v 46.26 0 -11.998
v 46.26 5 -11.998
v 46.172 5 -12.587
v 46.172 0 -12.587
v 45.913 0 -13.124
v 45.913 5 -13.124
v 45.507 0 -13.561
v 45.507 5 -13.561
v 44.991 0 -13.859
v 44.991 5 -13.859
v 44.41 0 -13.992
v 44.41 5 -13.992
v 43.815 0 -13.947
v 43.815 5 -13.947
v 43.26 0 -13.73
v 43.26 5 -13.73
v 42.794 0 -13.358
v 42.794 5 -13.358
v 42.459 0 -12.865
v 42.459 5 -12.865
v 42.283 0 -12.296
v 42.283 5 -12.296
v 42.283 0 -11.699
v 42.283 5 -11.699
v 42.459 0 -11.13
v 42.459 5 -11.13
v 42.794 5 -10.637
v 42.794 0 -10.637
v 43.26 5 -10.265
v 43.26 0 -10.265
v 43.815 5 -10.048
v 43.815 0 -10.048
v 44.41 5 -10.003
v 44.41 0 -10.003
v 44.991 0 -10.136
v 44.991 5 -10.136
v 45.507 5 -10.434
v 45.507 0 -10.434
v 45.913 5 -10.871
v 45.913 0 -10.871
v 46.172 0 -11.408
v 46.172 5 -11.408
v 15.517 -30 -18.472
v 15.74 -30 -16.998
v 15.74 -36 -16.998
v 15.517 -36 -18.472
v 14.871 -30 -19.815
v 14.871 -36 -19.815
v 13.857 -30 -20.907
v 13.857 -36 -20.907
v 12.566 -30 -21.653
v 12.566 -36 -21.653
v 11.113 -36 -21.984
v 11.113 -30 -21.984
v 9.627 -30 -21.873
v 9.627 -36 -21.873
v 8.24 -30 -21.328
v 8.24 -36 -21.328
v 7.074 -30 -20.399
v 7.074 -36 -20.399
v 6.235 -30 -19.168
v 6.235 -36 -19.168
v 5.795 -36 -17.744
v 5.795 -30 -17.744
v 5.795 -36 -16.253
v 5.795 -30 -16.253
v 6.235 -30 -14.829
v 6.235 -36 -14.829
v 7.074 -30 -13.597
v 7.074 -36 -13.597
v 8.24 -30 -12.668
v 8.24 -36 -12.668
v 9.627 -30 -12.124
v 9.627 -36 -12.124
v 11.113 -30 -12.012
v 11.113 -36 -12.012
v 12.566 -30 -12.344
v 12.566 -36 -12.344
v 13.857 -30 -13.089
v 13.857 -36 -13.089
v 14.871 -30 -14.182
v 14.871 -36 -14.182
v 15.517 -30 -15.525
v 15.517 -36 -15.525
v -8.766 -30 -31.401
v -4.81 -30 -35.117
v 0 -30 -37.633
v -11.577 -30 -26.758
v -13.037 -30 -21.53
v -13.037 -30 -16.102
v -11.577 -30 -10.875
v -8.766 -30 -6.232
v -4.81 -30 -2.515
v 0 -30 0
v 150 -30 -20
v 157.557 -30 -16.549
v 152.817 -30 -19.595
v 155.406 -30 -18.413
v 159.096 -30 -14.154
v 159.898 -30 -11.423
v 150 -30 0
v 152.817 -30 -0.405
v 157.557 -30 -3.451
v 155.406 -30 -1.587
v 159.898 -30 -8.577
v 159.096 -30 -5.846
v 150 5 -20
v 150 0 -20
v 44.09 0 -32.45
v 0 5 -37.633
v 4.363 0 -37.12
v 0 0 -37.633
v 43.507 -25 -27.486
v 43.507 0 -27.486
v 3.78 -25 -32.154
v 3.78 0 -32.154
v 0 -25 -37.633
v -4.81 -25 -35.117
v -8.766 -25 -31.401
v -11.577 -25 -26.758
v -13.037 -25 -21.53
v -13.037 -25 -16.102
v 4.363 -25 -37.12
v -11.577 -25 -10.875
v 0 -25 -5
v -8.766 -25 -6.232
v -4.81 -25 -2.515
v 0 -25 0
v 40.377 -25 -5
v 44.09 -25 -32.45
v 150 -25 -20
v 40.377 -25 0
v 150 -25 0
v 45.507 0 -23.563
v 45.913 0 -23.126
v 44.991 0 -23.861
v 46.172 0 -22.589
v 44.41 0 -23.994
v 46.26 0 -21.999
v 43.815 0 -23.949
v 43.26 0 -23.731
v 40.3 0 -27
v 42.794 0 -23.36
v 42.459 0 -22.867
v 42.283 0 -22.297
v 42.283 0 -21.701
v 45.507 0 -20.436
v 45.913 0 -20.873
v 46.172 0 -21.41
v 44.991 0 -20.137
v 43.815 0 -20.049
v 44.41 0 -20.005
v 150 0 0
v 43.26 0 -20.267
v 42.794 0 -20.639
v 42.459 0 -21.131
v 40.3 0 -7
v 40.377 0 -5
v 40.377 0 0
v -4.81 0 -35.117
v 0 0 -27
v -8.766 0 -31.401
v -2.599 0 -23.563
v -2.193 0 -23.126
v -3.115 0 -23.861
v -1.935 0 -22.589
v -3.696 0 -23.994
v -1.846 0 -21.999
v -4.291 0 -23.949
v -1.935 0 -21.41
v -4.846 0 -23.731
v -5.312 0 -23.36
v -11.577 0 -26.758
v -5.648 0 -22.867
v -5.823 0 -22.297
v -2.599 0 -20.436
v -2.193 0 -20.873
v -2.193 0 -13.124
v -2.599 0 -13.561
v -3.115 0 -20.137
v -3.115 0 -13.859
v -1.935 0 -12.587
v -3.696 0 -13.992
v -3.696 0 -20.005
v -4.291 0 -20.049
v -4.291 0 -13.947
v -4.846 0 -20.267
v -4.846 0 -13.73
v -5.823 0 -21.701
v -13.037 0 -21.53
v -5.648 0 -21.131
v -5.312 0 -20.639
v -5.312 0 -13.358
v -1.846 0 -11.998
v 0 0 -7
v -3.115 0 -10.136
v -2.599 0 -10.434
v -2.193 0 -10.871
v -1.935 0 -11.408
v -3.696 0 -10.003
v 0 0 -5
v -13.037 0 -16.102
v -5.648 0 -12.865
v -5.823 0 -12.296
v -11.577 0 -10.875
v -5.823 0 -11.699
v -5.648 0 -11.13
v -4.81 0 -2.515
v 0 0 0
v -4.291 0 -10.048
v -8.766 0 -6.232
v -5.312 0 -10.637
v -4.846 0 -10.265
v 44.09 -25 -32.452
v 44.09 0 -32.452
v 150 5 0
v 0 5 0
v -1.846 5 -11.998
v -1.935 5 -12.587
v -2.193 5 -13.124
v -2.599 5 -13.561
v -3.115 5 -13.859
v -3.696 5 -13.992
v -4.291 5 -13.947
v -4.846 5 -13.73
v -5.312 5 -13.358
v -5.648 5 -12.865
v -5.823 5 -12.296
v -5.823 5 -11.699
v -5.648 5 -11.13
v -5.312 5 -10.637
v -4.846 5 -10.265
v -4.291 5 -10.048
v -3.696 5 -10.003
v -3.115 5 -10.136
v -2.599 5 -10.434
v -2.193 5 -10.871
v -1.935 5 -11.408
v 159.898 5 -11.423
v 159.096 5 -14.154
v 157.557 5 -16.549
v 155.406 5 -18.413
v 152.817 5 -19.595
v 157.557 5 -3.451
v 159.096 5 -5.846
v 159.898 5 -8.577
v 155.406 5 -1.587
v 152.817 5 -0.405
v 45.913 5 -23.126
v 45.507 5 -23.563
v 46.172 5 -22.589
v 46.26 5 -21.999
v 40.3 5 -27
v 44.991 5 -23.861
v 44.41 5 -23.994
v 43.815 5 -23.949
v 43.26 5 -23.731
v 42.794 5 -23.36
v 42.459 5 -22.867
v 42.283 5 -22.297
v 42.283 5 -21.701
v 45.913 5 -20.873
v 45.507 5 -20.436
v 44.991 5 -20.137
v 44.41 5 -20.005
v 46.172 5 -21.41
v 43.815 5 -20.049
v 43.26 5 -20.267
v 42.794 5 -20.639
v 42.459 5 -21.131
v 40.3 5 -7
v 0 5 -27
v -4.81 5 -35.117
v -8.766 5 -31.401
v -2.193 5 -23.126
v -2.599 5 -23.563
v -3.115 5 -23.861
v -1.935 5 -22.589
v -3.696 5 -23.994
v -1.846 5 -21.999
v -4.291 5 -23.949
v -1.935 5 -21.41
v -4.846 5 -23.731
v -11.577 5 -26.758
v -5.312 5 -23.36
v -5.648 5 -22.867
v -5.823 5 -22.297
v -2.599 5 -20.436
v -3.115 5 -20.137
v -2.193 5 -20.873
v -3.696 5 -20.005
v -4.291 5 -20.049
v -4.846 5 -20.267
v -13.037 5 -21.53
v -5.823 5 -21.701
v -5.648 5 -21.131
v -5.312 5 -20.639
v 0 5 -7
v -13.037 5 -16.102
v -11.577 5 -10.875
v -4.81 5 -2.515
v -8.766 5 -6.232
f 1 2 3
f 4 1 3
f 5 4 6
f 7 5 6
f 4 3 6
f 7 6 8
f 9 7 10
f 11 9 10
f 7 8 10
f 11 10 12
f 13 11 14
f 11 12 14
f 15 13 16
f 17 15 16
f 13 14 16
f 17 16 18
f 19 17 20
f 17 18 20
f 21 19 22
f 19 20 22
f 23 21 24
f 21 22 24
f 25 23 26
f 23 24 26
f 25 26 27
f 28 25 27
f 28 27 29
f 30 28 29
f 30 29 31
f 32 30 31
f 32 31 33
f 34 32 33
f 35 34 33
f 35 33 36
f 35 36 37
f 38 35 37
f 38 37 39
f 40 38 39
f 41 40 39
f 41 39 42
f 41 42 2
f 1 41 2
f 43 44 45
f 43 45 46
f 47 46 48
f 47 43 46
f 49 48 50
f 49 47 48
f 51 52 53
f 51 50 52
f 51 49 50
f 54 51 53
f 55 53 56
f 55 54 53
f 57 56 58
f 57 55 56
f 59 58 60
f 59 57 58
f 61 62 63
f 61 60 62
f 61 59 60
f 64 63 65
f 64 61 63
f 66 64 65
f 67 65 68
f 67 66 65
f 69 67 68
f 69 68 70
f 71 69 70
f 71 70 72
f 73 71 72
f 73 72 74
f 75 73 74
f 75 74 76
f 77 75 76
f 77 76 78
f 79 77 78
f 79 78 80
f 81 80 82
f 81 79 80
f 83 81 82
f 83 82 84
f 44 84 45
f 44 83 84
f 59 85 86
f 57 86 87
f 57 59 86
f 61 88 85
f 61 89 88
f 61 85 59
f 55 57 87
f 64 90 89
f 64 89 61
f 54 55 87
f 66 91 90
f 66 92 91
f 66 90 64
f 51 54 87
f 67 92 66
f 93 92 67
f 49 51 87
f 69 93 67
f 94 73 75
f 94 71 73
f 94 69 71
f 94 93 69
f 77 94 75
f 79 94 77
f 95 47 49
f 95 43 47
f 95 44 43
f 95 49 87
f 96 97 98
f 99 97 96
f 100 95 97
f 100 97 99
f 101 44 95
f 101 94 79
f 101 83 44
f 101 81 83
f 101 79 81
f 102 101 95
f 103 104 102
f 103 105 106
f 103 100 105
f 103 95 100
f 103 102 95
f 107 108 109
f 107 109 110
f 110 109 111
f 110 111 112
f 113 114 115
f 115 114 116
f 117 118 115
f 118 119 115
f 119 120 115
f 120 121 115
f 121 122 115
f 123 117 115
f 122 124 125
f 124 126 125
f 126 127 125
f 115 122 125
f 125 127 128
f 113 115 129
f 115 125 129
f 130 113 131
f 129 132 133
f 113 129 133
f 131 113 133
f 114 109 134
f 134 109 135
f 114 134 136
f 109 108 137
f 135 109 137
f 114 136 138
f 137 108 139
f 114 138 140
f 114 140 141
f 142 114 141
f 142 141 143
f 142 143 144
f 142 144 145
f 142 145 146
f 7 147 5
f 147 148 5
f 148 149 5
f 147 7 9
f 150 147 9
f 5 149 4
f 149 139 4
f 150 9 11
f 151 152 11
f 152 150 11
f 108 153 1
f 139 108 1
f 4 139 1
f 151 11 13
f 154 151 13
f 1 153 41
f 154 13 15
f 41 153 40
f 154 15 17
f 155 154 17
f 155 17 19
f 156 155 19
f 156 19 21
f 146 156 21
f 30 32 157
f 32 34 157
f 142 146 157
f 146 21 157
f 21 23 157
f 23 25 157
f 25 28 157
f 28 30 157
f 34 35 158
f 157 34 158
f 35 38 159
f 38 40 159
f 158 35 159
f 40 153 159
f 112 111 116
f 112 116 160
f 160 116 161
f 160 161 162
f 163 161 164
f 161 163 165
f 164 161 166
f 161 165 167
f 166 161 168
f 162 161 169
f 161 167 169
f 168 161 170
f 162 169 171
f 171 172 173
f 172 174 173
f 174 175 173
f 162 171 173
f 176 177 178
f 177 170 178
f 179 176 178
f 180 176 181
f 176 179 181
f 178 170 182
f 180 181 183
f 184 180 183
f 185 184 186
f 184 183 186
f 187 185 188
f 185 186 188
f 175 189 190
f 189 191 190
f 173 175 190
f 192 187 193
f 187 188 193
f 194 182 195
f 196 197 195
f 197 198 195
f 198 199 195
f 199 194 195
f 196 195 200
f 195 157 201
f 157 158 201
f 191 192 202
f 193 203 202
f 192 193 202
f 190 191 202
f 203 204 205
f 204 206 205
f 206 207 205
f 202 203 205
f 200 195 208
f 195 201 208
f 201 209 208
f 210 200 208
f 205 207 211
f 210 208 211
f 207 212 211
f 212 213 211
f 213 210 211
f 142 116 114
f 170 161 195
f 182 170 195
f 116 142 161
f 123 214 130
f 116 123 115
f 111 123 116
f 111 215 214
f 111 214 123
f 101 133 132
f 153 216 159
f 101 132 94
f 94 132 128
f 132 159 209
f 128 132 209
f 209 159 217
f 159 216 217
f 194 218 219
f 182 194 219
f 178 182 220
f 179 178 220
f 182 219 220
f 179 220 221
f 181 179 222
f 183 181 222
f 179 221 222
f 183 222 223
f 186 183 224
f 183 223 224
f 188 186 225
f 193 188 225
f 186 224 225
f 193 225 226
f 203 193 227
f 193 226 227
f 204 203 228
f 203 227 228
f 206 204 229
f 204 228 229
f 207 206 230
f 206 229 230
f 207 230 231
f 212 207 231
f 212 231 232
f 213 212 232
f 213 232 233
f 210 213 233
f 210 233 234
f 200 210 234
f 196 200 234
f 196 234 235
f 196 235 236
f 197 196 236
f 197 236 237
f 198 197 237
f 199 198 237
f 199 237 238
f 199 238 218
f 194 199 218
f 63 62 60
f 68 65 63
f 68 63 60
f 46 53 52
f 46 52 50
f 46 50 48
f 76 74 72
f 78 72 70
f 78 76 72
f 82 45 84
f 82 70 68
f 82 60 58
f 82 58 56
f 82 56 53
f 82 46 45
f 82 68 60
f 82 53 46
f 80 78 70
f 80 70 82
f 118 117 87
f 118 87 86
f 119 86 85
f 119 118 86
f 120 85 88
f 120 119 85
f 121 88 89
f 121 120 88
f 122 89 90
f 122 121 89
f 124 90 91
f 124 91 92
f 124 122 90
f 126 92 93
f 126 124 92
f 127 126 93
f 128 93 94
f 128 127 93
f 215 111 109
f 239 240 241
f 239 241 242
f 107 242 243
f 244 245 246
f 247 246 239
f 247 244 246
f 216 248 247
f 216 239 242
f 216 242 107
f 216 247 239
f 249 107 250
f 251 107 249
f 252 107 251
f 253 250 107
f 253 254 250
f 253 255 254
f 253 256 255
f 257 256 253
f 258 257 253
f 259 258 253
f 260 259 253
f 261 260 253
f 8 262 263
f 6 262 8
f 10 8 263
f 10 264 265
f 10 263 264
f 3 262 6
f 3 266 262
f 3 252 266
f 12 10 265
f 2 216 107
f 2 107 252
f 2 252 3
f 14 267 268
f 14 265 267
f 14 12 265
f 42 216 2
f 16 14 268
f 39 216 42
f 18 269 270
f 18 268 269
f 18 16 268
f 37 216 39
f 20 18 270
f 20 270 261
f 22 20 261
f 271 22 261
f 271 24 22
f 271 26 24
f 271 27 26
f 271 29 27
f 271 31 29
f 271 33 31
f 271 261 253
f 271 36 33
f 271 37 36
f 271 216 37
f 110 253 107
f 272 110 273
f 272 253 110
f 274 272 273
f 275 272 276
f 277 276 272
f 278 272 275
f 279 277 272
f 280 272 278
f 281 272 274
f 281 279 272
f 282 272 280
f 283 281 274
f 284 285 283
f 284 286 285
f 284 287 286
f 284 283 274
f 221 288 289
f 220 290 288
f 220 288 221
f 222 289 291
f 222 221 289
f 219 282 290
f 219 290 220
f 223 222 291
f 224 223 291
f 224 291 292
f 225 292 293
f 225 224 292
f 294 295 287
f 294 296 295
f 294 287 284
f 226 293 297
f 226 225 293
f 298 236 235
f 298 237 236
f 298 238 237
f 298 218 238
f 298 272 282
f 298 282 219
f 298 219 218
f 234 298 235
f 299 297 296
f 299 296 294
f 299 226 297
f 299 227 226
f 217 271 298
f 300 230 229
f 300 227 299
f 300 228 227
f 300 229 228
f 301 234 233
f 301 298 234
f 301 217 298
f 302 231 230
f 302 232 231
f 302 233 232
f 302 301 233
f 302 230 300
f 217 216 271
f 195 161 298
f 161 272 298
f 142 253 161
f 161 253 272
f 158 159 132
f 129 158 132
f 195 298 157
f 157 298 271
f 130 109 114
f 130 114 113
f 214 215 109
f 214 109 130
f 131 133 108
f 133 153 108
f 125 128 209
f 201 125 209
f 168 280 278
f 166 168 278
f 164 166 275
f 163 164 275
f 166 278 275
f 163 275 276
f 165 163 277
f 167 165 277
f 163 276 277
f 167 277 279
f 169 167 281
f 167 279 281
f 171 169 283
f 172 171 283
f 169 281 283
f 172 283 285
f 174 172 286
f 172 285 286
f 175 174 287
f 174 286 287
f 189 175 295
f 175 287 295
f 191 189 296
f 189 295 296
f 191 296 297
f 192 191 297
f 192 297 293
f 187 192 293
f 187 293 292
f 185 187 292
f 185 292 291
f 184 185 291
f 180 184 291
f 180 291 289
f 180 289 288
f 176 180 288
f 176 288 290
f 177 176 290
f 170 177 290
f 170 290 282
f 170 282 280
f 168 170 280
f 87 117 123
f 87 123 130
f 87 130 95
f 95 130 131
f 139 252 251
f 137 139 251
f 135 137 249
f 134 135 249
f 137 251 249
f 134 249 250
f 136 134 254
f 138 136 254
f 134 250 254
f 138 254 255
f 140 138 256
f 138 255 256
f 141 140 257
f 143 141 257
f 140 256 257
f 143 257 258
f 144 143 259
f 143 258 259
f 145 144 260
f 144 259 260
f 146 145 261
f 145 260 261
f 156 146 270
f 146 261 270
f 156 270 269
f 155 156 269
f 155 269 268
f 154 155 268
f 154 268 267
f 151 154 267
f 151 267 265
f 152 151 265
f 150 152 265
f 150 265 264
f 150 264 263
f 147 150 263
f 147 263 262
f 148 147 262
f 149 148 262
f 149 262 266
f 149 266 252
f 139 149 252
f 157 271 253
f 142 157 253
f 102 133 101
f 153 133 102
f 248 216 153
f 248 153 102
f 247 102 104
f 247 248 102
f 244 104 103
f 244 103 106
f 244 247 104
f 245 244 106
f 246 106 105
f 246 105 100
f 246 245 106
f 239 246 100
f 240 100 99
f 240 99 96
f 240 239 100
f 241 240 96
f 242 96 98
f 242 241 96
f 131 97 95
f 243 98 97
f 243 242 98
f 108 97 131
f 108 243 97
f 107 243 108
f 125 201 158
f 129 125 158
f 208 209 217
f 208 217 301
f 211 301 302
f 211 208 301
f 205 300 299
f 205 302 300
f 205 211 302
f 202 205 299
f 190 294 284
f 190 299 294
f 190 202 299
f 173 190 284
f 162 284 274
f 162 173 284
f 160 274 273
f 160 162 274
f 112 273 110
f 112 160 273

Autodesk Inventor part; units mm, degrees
ref_plane "YZ Plane" through (0, 0, 0) normal (1, 0, 0) x (0, 1, 0)
ref_plane "XZ Plane" through (0, 0, 0) normal (0, 1, 0) x (-1, 0, 0)
sketch "Sketch1" plane through (0, 0, 0) normal (0, 1, 0) x (-1, 0, 0)
  line L0 (0, 0) -> (-150, 0)
  line L1 (-150, 0) -> (-150, -20) construction
  line L2 (-150, -20) -> (0, -37.6327)
  line L3 (0, -37.6327) -> (0, 0) construction
  arc A0 (-150, 0) -> (-150, -20) centre (-150, -10) ccw
  arc A1 (0, -37.6327) -> (0, 0) centre (-6.7783, -18.8163) ccw
  dimension "d0" = 150
  dimension "d1" = 20
  dimension "d3" = 20
extrude "Extrusion1" add sketch "Sketch1" along normal blind 5
sketch "Sketch5" plane through (0, 5, 0) normal (0, 1, 0) x (1, 0, 0)
  line L0 (0, 7) -> (40.3, 7)
  line L1 (40.3, 7) -> (40.3, 27)
  line L2 (40.3, 27) -> (0, 27)
  line L3 (0, 27) -> (0, 7)
  line L4 (0, 0) -> (150, 0) projected
  arc A0 (0, 37.6327) -> (0, 0) centre (6.7783, 18.8163) ccw projected
  line L5 (0, 0) -> (0, 37.6327) construction
  dimension "d13" = 40.3
  dimension "d14" = 20
  dimension "d15" = 7
  dimension "d16" = 0
extrude "Extrusion3" cut sketch "Sketch5" against normal blind 5
ref_plane "Work Plane1" through (0, -12.5, 0) normal (0, -1, 0) x (1, 0, 0)
mirror "Mirror1" about plane through (0, -12.5, 0) normal (0, -1, 0) of "Extrusion1"
sketch "Sketch8" plane through (0, 0, 0) normal (0, 0, 1) x (1, 0, 0)
  line L0 (0, 0) -> (40.3, 0) projected
  line L1 (0, -25) -> (150, -25) projected
  line L2 (0, 0) -> (40.3767, 0)
  line L3 (40.3767, 0) -> (40.3767, -25)
  line L4 (40.3767, -25) -> (0, -25)
  line L5 (0, -25) -> (0, 0)
extrude "Extrusion4" add sketch "Sketch8" against normal blind 5
sketch "Sketch11" plane through (0, 5, 0) normal (0, 1, 0) x (1, 0, 0)
  circle A0 centre (-3.8458, 11.9975) radius 2
  circle A1 centre (-3.8458, 11.9975) radius 2 projected
  circle A2 centre (-3.8458, 21.9992) radius 2
  circle A3 centre (44.2605, 21.9992) radius 2
  circle A4 centre (-3.8458, 21.9992) radius 2 projected
  circle A5 centre (44.2605, 11.9975) radius 2 projected
  circle A6 centre (44.2605, 21.9992) radius 2 projected
  circle A7 centre (44.2605, 11.9975) radius 2
  point P0 (0, 0)
extrude "Extrusion6" cut sketch "Sketch11" against normal blind 5
sketch "Sketch14" plane through (0, 0, -37.6327) normal (0.1167, 0, -0.9932) x (-0.9932, 0, -0.1167)
  line L0 (-151.0328, -25) -> (0, -25) projected
  line L1 (-4.3935, 0) -> (-44.3935, 0)
  line L2 (-44.3935, 0) -> (-44.3935, -25)
  line L3 (-44.3935, -25) -> (-4.3935, -25)
  line L4 (-4.3935, -25) -> (-4.3935, 0)
  dimension "d31" = 40
extrude "Extrusion7" add sketch "Sketch14" against normal blind 5
sketch "Sketch17" plane through (0, 5, 0) normal (0, 1, 0) x (1, 0, 0)
  arc A0 (150, 0) -> (150, 20) centre (150, 10) ccw projected
  line L0 (150, 20) -> (44.0899, 32.4499) projected
  line L1 (150, 0) -> (150, 20)
  point P0 (0, 0)
extrude "Extrusion10" add sketch "Sketch17" against normal up to surface (35 mm away)
sketch "Sketch18" plane through (0, -30, 0) normal (0, -1, 0) x (1, 0, 0)
  circle A0 centre (10.7396, -16.9983) radius 5
  circle A1 centre (10.7396, -16.9983) radius 2.9 projected
  point P0 (0, 0)
  dimension "d42" = 10
extrude "Extrusion11" add sketch "Sketch18" along normal blind 6 contours A0 | A1
properties part number "Tibia" material "PVC, Unplasticized"
